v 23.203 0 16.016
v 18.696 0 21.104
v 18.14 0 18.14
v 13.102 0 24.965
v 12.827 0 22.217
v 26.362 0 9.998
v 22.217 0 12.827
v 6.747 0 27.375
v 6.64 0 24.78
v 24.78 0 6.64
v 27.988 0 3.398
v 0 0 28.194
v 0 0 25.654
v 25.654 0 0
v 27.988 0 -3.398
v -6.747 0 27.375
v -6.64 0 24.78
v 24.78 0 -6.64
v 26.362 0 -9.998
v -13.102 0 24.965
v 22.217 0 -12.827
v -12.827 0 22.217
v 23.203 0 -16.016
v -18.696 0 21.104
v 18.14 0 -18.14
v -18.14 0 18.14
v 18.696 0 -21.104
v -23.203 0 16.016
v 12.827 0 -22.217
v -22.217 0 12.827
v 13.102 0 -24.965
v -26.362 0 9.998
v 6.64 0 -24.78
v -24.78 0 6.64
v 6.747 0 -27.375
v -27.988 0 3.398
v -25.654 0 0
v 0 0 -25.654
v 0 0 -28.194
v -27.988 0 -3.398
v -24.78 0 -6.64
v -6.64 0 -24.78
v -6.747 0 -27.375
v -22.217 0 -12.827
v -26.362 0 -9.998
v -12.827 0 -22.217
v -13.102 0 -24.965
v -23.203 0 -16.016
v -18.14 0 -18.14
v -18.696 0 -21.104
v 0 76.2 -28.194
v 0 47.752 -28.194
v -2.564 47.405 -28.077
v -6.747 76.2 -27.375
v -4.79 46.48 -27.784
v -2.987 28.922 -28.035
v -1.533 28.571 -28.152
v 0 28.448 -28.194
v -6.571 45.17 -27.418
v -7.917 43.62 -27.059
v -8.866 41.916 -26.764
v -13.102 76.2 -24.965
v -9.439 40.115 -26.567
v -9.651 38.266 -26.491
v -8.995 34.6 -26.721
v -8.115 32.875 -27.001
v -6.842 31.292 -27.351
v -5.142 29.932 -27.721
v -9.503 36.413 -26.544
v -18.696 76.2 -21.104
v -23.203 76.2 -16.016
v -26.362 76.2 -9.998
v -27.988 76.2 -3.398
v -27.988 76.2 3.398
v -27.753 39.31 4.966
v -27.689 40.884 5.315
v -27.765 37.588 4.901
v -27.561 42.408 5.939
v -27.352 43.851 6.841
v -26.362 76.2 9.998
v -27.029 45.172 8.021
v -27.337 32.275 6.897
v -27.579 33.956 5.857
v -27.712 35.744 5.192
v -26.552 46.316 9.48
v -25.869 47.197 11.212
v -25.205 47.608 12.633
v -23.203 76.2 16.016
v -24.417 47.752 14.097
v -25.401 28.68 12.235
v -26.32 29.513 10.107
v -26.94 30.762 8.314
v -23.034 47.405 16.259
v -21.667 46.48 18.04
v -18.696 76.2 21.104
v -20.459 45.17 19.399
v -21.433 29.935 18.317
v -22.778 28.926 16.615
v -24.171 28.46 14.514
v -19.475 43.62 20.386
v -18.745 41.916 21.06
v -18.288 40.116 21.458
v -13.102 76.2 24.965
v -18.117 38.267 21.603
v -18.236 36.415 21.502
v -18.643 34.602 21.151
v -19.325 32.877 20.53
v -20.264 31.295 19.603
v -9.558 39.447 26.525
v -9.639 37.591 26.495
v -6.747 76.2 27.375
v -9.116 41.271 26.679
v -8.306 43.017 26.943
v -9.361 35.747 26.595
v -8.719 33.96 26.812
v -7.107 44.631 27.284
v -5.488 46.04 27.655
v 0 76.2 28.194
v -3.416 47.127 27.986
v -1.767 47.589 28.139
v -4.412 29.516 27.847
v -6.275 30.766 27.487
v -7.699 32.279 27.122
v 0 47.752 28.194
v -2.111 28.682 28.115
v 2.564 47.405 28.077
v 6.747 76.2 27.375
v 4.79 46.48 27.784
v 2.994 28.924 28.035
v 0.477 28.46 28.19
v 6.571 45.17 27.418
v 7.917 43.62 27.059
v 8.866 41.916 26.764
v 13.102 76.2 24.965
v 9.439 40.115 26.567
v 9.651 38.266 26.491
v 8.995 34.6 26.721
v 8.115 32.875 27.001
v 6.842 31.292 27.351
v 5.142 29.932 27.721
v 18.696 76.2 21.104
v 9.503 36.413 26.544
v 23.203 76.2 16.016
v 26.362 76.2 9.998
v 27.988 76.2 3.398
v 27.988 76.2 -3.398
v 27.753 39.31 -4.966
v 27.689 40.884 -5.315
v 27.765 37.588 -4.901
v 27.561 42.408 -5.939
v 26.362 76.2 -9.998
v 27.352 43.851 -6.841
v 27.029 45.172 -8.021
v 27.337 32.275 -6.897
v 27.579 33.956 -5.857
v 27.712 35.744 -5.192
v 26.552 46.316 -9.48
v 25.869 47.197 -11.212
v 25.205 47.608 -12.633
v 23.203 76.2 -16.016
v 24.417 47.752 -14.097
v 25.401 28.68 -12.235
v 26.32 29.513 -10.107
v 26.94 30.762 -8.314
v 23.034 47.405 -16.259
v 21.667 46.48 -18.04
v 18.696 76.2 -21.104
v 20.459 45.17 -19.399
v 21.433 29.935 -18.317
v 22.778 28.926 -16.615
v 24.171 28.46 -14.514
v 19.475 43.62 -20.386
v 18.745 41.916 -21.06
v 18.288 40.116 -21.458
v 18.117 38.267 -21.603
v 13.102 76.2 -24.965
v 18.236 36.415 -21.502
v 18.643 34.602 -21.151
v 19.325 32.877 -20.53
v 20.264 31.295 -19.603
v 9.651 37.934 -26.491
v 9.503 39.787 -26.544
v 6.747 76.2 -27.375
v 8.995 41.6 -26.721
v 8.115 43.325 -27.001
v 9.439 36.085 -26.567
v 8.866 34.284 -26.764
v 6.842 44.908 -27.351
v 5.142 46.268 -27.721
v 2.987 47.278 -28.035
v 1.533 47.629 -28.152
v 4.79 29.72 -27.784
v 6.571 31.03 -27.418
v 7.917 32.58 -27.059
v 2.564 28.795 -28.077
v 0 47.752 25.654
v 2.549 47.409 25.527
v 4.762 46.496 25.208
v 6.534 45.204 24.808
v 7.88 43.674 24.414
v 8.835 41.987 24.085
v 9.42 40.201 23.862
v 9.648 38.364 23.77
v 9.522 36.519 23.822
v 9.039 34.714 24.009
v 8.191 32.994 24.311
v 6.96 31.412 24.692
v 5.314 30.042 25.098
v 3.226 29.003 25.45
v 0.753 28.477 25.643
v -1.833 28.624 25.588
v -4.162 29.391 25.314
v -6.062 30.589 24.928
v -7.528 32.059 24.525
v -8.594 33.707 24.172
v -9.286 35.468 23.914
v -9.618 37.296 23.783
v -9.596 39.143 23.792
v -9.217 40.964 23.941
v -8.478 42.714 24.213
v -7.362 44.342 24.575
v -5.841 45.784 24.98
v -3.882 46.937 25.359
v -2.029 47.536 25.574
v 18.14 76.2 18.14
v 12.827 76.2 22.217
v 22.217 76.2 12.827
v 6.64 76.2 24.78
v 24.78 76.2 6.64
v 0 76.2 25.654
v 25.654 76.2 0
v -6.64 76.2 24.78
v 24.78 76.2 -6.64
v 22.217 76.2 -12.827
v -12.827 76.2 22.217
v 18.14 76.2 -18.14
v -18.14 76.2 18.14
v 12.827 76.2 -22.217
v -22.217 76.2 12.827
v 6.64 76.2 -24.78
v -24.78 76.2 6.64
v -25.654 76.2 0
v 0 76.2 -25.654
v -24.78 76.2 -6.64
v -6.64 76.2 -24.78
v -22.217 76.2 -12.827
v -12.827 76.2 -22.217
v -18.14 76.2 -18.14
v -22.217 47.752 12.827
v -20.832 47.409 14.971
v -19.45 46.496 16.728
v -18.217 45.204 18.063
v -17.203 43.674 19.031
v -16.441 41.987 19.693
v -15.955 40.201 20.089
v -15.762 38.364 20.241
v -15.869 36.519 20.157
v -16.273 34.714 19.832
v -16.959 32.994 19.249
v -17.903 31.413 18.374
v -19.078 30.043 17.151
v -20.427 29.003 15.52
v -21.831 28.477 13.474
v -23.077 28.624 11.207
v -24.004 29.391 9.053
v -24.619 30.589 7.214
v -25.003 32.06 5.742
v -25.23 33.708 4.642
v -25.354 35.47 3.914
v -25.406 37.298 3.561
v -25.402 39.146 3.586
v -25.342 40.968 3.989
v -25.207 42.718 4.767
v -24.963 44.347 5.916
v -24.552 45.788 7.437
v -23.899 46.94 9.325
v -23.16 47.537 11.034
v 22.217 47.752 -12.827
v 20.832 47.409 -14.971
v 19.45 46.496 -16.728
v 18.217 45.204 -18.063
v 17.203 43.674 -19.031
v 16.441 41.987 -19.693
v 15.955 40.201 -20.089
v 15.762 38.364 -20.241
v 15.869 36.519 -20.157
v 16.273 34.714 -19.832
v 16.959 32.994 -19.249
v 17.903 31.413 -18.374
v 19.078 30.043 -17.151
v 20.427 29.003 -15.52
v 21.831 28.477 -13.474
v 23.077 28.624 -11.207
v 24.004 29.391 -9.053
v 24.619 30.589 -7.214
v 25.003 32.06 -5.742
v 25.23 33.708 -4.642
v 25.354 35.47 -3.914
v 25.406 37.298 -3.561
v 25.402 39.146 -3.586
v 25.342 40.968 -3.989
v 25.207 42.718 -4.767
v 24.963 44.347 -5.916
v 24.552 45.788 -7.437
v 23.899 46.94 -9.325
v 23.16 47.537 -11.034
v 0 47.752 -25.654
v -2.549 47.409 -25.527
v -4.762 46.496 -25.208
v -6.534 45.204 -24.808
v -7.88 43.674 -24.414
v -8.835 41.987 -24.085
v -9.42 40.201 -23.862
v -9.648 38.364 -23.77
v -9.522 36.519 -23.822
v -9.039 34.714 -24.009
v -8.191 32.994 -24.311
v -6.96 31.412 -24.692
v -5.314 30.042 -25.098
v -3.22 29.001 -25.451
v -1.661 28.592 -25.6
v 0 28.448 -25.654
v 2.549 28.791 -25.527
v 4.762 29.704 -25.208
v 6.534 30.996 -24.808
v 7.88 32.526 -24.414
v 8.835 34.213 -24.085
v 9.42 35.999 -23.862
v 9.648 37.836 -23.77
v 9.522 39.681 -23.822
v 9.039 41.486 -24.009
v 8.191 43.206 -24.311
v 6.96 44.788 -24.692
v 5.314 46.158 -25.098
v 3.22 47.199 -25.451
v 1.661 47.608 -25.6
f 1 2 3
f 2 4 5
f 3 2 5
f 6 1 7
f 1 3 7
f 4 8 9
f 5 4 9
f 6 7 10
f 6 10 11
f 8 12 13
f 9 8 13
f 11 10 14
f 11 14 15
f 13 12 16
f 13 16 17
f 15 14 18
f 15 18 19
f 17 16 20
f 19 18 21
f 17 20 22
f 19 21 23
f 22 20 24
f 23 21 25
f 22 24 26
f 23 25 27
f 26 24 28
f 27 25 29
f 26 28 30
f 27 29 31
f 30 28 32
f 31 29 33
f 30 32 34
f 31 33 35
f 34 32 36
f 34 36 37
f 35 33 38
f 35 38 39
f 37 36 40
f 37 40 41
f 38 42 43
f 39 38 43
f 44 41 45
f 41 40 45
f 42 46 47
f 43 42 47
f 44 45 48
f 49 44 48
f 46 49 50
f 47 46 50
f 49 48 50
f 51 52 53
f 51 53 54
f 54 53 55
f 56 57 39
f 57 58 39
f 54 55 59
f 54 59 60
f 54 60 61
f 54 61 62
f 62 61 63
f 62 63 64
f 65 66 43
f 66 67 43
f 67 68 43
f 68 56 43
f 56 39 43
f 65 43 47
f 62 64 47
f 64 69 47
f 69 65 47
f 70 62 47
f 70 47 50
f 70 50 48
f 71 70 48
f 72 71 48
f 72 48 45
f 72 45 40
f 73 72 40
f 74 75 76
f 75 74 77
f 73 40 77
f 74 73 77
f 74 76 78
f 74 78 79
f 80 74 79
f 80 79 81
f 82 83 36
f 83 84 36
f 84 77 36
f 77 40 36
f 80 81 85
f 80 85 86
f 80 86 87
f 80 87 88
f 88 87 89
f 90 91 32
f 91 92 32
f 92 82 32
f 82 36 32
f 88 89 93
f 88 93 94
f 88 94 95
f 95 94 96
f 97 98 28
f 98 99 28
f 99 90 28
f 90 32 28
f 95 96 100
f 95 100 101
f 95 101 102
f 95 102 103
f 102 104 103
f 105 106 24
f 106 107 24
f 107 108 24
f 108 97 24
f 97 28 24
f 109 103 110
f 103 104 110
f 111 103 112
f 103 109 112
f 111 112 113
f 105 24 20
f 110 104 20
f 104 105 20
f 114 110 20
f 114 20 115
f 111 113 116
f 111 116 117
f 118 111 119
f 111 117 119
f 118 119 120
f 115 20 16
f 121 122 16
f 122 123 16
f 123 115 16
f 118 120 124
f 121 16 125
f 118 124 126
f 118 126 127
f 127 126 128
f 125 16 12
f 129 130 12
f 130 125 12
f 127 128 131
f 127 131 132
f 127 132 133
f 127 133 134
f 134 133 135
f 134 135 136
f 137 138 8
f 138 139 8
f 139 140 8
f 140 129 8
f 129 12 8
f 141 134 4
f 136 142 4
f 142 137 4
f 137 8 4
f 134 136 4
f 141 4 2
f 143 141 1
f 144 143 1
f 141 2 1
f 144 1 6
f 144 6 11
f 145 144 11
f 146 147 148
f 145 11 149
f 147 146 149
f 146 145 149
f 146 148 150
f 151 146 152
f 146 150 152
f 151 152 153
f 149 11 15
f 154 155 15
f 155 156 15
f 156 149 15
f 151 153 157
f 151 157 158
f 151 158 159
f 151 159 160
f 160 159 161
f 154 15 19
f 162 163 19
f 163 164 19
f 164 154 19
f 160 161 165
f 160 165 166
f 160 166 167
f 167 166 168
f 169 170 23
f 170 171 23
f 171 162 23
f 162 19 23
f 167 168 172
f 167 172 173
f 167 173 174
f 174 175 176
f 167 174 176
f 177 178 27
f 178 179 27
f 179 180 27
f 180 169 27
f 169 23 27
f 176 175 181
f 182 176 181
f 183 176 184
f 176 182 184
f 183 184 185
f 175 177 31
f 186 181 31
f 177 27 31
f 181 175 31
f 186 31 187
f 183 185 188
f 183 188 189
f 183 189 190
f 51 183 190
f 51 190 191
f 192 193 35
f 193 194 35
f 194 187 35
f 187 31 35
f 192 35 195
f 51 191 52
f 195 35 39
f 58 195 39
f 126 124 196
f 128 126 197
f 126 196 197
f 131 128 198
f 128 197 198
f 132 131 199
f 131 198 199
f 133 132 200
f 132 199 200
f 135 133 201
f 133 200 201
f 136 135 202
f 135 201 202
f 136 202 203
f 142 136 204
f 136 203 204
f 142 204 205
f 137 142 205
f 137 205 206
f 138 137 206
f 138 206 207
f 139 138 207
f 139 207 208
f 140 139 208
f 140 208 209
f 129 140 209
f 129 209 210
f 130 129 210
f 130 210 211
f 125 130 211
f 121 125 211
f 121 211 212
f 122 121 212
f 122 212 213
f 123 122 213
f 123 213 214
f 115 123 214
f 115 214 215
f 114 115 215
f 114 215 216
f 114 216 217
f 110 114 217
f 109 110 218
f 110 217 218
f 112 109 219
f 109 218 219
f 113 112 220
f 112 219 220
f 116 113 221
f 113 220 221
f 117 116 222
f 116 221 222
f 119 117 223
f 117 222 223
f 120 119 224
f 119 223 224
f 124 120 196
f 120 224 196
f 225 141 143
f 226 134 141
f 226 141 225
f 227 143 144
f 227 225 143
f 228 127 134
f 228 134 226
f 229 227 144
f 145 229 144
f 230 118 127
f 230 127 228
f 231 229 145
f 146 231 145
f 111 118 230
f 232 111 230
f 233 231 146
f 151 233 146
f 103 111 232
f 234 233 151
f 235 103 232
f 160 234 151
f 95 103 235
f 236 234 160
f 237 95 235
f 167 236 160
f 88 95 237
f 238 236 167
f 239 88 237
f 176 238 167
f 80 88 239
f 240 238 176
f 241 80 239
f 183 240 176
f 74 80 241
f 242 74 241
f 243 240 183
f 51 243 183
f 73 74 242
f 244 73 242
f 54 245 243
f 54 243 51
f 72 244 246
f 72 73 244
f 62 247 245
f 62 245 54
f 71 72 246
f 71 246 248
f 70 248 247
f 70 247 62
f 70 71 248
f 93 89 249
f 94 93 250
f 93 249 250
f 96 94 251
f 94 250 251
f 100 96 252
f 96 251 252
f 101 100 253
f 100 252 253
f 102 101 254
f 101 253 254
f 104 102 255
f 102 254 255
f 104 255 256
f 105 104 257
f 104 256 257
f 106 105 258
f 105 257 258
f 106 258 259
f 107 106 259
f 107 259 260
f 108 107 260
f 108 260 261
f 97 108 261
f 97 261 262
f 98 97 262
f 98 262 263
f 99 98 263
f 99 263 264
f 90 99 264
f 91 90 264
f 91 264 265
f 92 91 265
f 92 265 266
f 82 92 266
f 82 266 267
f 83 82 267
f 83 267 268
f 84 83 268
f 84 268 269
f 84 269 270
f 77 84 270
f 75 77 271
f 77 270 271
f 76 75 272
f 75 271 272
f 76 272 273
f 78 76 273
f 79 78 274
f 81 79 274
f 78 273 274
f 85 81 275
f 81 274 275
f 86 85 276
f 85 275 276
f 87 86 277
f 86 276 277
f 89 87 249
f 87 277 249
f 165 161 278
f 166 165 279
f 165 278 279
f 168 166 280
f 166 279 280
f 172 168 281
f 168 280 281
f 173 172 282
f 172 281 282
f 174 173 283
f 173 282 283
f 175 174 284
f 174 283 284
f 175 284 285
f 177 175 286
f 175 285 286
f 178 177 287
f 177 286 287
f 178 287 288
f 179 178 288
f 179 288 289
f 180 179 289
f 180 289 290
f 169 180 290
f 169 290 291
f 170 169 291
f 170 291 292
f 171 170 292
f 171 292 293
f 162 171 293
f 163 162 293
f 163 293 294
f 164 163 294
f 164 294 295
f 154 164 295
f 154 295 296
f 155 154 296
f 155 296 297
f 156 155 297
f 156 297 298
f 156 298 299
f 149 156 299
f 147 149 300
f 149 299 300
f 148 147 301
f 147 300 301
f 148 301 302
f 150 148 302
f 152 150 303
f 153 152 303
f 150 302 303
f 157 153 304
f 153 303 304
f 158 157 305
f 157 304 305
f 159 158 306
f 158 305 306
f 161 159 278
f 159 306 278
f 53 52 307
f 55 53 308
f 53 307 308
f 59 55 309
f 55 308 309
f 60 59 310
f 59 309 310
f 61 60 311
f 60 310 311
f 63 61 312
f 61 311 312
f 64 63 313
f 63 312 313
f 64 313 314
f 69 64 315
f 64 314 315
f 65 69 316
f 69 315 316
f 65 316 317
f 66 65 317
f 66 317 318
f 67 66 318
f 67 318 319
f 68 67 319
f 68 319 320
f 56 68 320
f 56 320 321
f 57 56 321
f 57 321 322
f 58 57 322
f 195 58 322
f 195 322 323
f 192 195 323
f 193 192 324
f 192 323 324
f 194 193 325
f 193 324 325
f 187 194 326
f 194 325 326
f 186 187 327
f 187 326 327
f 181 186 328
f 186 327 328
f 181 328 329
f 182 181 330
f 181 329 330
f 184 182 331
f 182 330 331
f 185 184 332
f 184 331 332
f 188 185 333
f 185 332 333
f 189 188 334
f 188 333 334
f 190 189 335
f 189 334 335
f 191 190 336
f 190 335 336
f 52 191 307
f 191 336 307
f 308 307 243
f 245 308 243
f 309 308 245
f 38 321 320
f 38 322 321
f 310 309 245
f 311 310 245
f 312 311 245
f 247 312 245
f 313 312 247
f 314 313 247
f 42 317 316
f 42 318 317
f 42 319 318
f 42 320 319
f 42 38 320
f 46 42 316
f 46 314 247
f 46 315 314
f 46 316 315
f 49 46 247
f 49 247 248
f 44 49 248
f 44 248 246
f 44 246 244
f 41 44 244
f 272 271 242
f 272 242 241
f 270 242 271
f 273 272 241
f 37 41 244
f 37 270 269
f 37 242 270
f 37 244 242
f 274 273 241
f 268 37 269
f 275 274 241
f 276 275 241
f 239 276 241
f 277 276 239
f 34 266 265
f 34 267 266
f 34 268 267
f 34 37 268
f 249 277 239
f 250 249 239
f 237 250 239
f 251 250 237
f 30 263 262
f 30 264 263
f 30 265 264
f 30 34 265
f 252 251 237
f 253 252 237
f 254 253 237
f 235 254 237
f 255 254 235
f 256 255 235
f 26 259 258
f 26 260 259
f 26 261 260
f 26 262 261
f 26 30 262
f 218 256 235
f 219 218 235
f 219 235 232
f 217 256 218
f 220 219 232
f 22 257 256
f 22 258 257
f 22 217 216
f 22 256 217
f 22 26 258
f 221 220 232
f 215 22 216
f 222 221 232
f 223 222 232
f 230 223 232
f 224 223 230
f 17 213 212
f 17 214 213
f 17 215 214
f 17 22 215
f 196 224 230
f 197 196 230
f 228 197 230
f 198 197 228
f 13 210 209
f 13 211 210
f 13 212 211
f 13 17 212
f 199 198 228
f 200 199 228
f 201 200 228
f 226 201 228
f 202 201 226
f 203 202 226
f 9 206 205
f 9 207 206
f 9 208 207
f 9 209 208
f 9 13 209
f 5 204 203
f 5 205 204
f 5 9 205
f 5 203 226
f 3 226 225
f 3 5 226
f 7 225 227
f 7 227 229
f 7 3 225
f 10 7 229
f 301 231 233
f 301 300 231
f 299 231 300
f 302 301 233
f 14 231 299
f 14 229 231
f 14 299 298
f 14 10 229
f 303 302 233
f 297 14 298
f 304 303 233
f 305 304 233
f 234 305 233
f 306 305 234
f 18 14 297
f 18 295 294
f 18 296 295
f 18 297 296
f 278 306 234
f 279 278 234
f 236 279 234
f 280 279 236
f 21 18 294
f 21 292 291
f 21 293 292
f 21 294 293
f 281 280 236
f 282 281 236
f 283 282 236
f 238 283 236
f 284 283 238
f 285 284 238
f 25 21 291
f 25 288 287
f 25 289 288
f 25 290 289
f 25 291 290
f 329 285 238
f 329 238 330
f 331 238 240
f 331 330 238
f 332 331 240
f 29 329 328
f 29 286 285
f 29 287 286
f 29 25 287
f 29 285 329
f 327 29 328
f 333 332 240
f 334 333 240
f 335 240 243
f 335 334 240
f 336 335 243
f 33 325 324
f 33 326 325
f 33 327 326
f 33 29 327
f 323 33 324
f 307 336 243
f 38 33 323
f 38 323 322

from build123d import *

# Parameters (mm, degrees)
SKETCH2_R           = 28.194
SKETCH2_R_2         = 25.654
BOSS_EXTRUDE1_DEPTH = 76.2
SKETCH3_R           = 9.652
CUT_EXTRUDE1_DEPTH  = 76.2
CIRPATTERN1_COUNT   = 2
CIRPATTERN1_ANGLE   = 60
CIRPATTERN2_COUNT   = 2
CIRPATTERN3_COUNT   = 2
CIRPATTERN3_ANGLE   = 120


with BuildPart() as part:
    # Sketch2 → Boss-Extrude1 (new body)
    with BuildSketch(Plane(origin=(0, 0, 0), x_dir=(1, 0, 0), z_dir=(0, 1, 0))):
        with Locations(Location((0, 0, 0), (0, 0, 90))):
            Circle(SKETCH2_R)
        with Locations(Location((0, 0, 0), (0, 0, 90))):
            Circle(SKETCH2_R_2, mode=Mode.SUBTRACT)
    extrude(amount=BOSS_EXTRUDE1_DEPTH)

    # Sketch3 → Cut-Extrude1 (cut)
    with BuildSketch(Plane.XY):
        with Locations(Location((0, 38.1, 0), (0, 0, 90))):
            Circle(SKETCH3_R)
    cut_extrude1 = extrude(amount=-CUT_EXTRUDE1_DEPTH, mode=Mode.SUBTRACT)

    # CirPattern1: Cut-Extrude1 ×2 about axis
    cirpattern1_axis = Axis((0, 76.2, 0), (0, -1, 0))
    for i in range(1, CIRPATTERN1_COUNT):
        add(cut_extrude1.rotate(cirpattern1_axis, i * CIRPATTERN1_ANGLE / (CIRPATTERN1_COUNT - 1)), mode=Mode.SUBTRACT)

    # CirPattern2: Cut-Extrude1 ×2 about axis
    cirpattern2_axis = Axis((0, 76.2, 0), (0, -1, 0))
    for i in range(1, CIRPATTERN2_COUNT):
        add(cut_extrude1.rotate(cirpattern2_axis, i * 360 / CIRPATTERN2_COUNT), mode=Mode.SUBTRACT)

    # CirPattern3: Cut-Extrude1 ×2 about axis
    cirpattern3_axis = Axis((0, 76.2, 0), (0, 1, 0))
    for i in range(1, CIRPATTERN3_COUNT):
        add(cut_extrude1.rotate(cirpattern3_axis, i * CIRPATTERN3_ANGLE / (CIRPATTERN3_COUNT - 1)), mode=Mode.SUBTRACT)


solid = part.part
